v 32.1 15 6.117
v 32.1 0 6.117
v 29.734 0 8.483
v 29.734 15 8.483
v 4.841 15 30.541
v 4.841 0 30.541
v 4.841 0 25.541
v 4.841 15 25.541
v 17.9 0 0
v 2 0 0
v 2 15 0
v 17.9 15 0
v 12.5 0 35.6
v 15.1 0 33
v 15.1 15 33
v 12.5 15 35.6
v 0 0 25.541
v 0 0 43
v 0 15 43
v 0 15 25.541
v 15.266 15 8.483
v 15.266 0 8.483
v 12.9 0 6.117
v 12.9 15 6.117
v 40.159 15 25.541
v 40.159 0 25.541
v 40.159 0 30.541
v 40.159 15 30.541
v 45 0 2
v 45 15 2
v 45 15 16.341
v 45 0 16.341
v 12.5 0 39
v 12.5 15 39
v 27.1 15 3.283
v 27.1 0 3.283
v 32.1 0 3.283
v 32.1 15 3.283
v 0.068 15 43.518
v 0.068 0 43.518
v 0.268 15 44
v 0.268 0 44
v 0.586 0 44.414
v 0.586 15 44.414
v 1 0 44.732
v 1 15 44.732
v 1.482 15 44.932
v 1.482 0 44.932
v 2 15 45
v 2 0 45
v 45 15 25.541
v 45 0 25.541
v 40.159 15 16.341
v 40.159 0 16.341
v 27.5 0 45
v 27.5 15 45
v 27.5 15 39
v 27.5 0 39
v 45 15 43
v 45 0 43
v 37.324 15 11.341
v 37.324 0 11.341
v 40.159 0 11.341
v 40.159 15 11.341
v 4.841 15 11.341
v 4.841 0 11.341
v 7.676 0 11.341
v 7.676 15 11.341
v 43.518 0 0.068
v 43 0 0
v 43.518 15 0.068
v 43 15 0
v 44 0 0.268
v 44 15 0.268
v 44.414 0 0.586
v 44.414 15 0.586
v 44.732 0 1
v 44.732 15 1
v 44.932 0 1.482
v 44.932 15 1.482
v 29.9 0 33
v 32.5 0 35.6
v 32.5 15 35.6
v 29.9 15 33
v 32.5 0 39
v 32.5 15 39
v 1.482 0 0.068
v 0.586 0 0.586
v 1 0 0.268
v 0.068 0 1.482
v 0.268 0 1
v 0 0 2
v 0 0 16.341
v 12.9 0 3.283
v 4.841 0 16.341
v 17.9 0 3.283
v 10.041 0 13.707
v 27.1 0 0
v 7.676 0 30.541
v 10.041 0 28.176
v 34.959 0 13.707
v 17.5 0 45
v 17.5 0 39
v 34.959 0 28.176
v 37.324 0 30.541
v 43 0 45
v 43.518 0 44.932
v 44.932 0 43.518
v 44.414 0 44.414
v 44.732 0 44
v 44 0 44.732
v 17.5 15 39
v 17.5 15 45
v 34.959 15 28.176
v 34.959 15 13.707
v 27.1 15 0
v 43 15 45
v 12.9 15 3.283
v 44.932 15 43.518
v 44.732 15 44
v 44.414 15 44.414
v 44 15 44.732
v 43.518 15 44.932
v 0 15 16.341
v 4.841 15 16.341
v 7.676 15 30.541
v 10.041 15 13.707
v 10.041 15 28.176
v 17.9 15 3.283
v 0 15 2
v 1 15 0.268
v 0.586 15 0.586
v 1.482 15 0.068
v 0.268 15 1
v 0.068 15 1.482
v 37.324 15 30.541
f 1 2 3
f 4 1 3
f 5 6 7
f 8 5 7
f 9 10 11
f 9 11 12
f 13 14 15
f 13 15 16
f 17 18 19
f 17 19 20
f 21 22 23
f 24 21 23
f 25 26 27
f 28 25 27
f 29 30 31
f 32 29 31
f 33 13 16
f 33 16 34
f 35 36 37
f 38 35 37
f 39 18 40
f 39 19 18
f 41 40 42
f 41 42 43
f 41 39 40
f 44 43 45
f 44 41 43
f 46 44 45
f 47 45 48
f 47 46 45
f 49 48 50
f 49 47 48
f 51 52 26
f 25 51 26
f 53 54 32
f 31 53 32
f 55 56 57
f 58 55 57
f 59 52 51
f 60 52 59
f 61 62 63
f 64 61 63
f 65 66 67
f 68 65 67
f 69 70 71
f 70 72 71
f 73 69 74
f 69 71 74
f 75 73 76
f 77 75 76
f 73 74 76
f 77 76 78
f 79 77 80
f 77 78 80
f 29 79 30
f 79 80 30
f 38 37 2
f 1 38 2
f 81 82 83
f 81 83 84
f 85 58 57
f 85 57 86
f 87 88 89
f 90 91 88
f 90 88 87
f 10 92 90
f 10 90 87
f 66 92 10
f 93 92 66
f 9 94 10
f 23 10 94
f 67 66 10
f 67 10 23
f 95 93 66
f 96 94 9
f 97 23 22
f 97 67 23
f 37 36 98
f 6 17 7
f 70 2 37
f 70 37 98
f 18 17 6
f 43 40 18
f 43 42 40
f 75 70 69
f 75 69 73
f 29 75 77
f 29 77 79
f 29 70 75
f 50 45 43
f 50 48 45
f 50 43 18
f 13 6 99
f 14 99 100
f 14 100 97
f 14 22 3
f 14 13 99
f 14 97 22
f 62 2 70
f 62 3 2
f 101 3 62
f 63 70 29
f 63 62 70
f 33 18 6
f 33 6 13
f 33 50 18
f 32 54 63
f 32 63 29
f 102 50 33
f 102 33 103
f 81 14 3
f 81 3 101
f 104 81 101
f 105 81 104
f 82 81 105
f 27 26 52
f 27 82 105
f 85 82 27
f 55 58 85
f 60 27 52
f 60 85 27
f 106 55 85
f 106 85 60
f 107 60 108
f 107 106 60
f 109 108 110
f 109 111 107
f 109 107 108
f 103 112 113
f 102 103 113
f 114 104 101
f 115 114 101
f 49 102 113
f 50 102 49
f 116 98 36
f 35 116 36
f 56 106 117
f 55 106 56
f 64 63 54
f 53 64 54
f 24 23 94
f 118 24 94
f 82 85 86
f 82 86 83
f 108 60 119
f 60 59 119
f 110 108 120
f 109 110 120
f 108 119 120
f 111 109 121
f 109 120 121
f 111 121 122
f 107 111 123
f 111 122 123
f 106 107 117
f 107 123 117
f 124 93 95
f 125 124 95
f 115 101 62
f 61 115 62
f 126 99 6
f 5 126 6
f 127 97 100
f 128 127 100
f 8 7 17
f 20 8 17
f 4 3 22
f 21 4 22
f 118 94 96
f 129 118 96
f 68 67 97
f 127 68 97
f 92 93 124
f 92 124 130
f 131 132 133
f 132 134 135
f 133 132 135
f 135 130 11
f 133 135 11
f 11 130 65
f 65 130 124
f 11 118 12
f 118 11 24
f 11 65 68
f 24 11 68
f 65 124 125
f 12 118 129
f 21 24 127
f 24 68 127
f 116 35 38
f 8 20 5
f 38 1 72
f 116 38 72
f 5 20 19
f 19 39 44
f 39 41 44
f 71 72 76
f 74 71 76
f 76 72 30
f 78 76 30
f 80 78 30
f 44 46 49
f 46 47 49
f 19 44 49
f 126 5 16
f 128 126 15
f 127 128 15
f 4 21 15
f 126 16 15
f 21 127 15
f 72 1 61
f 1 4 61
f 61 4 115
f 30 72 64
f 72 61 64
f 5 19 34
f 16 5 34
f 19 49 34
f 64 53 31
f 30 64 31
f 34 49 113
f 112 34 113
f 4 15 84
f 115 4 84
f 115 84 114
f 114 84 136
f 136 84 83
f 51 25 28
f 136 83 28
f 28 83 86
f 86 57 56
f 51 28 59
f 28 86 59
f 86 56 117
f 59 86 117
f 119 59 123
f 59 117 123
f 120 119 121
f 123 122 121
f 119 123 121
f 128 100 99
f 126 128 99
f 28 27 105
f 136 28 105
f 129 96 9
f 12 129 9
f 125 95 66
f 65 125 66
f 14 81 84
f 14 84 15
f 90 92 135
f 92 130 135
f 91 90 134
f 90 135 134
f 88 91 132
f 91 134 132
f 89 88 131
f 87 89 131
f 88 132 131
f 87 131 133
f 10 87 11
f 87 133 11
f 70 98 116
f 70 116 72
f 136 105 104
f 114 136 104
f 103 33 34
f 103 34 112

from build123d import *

# Parameters (mm, degrees)
F1_DEPTH  = 15
F0_W      = 9.2000017166
F0_H      = 6.3999991417
F0_H_2    = 0.5
F0_W_2    = 4.957072109
F0_H_3    = 6
F0_H_4    = 4
F2_DEPTH  = 23
F4_DEPTH  = 52
F6_D      = 5
F7_R      = 2
F10_COUNT = 4


with BuildPart() as f1:
    # F0 (on Front) → F1 (new body)
    with BuildSketch(Plane.XZ):
        Polygon((0, 45), (0, 0), (45, 0), (45, 45), (32.5, 45), (27.5, 45), (27.5, 39), (32.5, 39), (32.5, 35.6), (29.9, 33), (15.1, 33), (12.5, 35.6), (12.5, 39), (17.5, 39), (17.5, 45), (12.5, 45), align=None)
    extrude(amount=-F1_DEPTH)

    # F7
    f7_edges = [f1.edges().sort_by_distance(p)[0] for p in [
        (0, 7.5, 45),
        (45, 7.5, 45),
        (45, 7.5, 0),
        (0, 7.5, 0),
    ]]
    fillet(f7_edges, radius=F7_R)

    # F10: F2 ×4 about axis
    f10_axis = Axis((22.5, -59.5842492698, 20.9414814264), (0, -1, 0))


with BuildPart() as f2:
    # F0 (on Front) → F2 (new body)
    with BuildSketch(Plane.XZ):
        with Locations((22.5, 41.8000004292)):
            Rectangle(F0_W, F0_H)
        Polygon((27.1000008583, 38.6000008583), (17.8999991417, 38.6000008583), (12.8999991417, 38.6000008583), (12.8999991417, 35.7656850694), (15.2656850694, 33.3999991417), (29.7343149306, 33.3999991417), (32.1000008583, 35.7656850694), (32.1000008583, 38.6000008583), align=None)
        with Locations((22.5, 45.25)):
            Rectangle(F0_W, F0_H_2)
        with Locations((29.5785369128, 48.5)):
            Rectangle(F0_W_2, F0_H_3)
        with Locations((22.5, 48.5)):
            Rectangle(F0_W, F0_H_3)
        with Locations((15.4214630872, 48.5)):
            Rectangle(F0_W_2, F0_H_3)
        with Locations((22.5, 53.5)):
            Rectangle(F0_W, F0_H_4)
    extrude(amount=-F2_DEPTH)

    # F0 (on Front) → F4 (join)
    with BuildSketch(Plane.XZ):
        with Locations((22.5, 45.25)):
            Rectangle(F0_W, F0_H_2)
        with Locations((22.5, 48.5)):
            Rectangle(F0_W, F0_H_3)
        with Locations((15.4214630872, 48.5)):
            Rectangle(F0_W_2, F0_H_3)
        with Locations((29.5785369128, 48.5)):
            Rectangle(F0_W_2, F0_H_3)
        with Locations((22.5, 53.5)):
            Rectangle(F0_W, F0_H_4)
    extrude(amount=-F4_DEPTH)

    # F6 (through all)
    with Locations(Plane.XY.offset(55.5)):
        with Locations((22.5, 26)):
            Hole(F6_D / 2)


with BuildPart() as f1_1:
    add(f1.part)
    for i in range(1, F10_COUNT):
        add(f2.part.rotate(f10_axis, i * 360 / F10_COUNT), mode=Mode.SUBTRACT)

    # F10#seed: cut F2
    add(f2.part, mode=Mode.SUBTRACT)


solid = f1_1.part
